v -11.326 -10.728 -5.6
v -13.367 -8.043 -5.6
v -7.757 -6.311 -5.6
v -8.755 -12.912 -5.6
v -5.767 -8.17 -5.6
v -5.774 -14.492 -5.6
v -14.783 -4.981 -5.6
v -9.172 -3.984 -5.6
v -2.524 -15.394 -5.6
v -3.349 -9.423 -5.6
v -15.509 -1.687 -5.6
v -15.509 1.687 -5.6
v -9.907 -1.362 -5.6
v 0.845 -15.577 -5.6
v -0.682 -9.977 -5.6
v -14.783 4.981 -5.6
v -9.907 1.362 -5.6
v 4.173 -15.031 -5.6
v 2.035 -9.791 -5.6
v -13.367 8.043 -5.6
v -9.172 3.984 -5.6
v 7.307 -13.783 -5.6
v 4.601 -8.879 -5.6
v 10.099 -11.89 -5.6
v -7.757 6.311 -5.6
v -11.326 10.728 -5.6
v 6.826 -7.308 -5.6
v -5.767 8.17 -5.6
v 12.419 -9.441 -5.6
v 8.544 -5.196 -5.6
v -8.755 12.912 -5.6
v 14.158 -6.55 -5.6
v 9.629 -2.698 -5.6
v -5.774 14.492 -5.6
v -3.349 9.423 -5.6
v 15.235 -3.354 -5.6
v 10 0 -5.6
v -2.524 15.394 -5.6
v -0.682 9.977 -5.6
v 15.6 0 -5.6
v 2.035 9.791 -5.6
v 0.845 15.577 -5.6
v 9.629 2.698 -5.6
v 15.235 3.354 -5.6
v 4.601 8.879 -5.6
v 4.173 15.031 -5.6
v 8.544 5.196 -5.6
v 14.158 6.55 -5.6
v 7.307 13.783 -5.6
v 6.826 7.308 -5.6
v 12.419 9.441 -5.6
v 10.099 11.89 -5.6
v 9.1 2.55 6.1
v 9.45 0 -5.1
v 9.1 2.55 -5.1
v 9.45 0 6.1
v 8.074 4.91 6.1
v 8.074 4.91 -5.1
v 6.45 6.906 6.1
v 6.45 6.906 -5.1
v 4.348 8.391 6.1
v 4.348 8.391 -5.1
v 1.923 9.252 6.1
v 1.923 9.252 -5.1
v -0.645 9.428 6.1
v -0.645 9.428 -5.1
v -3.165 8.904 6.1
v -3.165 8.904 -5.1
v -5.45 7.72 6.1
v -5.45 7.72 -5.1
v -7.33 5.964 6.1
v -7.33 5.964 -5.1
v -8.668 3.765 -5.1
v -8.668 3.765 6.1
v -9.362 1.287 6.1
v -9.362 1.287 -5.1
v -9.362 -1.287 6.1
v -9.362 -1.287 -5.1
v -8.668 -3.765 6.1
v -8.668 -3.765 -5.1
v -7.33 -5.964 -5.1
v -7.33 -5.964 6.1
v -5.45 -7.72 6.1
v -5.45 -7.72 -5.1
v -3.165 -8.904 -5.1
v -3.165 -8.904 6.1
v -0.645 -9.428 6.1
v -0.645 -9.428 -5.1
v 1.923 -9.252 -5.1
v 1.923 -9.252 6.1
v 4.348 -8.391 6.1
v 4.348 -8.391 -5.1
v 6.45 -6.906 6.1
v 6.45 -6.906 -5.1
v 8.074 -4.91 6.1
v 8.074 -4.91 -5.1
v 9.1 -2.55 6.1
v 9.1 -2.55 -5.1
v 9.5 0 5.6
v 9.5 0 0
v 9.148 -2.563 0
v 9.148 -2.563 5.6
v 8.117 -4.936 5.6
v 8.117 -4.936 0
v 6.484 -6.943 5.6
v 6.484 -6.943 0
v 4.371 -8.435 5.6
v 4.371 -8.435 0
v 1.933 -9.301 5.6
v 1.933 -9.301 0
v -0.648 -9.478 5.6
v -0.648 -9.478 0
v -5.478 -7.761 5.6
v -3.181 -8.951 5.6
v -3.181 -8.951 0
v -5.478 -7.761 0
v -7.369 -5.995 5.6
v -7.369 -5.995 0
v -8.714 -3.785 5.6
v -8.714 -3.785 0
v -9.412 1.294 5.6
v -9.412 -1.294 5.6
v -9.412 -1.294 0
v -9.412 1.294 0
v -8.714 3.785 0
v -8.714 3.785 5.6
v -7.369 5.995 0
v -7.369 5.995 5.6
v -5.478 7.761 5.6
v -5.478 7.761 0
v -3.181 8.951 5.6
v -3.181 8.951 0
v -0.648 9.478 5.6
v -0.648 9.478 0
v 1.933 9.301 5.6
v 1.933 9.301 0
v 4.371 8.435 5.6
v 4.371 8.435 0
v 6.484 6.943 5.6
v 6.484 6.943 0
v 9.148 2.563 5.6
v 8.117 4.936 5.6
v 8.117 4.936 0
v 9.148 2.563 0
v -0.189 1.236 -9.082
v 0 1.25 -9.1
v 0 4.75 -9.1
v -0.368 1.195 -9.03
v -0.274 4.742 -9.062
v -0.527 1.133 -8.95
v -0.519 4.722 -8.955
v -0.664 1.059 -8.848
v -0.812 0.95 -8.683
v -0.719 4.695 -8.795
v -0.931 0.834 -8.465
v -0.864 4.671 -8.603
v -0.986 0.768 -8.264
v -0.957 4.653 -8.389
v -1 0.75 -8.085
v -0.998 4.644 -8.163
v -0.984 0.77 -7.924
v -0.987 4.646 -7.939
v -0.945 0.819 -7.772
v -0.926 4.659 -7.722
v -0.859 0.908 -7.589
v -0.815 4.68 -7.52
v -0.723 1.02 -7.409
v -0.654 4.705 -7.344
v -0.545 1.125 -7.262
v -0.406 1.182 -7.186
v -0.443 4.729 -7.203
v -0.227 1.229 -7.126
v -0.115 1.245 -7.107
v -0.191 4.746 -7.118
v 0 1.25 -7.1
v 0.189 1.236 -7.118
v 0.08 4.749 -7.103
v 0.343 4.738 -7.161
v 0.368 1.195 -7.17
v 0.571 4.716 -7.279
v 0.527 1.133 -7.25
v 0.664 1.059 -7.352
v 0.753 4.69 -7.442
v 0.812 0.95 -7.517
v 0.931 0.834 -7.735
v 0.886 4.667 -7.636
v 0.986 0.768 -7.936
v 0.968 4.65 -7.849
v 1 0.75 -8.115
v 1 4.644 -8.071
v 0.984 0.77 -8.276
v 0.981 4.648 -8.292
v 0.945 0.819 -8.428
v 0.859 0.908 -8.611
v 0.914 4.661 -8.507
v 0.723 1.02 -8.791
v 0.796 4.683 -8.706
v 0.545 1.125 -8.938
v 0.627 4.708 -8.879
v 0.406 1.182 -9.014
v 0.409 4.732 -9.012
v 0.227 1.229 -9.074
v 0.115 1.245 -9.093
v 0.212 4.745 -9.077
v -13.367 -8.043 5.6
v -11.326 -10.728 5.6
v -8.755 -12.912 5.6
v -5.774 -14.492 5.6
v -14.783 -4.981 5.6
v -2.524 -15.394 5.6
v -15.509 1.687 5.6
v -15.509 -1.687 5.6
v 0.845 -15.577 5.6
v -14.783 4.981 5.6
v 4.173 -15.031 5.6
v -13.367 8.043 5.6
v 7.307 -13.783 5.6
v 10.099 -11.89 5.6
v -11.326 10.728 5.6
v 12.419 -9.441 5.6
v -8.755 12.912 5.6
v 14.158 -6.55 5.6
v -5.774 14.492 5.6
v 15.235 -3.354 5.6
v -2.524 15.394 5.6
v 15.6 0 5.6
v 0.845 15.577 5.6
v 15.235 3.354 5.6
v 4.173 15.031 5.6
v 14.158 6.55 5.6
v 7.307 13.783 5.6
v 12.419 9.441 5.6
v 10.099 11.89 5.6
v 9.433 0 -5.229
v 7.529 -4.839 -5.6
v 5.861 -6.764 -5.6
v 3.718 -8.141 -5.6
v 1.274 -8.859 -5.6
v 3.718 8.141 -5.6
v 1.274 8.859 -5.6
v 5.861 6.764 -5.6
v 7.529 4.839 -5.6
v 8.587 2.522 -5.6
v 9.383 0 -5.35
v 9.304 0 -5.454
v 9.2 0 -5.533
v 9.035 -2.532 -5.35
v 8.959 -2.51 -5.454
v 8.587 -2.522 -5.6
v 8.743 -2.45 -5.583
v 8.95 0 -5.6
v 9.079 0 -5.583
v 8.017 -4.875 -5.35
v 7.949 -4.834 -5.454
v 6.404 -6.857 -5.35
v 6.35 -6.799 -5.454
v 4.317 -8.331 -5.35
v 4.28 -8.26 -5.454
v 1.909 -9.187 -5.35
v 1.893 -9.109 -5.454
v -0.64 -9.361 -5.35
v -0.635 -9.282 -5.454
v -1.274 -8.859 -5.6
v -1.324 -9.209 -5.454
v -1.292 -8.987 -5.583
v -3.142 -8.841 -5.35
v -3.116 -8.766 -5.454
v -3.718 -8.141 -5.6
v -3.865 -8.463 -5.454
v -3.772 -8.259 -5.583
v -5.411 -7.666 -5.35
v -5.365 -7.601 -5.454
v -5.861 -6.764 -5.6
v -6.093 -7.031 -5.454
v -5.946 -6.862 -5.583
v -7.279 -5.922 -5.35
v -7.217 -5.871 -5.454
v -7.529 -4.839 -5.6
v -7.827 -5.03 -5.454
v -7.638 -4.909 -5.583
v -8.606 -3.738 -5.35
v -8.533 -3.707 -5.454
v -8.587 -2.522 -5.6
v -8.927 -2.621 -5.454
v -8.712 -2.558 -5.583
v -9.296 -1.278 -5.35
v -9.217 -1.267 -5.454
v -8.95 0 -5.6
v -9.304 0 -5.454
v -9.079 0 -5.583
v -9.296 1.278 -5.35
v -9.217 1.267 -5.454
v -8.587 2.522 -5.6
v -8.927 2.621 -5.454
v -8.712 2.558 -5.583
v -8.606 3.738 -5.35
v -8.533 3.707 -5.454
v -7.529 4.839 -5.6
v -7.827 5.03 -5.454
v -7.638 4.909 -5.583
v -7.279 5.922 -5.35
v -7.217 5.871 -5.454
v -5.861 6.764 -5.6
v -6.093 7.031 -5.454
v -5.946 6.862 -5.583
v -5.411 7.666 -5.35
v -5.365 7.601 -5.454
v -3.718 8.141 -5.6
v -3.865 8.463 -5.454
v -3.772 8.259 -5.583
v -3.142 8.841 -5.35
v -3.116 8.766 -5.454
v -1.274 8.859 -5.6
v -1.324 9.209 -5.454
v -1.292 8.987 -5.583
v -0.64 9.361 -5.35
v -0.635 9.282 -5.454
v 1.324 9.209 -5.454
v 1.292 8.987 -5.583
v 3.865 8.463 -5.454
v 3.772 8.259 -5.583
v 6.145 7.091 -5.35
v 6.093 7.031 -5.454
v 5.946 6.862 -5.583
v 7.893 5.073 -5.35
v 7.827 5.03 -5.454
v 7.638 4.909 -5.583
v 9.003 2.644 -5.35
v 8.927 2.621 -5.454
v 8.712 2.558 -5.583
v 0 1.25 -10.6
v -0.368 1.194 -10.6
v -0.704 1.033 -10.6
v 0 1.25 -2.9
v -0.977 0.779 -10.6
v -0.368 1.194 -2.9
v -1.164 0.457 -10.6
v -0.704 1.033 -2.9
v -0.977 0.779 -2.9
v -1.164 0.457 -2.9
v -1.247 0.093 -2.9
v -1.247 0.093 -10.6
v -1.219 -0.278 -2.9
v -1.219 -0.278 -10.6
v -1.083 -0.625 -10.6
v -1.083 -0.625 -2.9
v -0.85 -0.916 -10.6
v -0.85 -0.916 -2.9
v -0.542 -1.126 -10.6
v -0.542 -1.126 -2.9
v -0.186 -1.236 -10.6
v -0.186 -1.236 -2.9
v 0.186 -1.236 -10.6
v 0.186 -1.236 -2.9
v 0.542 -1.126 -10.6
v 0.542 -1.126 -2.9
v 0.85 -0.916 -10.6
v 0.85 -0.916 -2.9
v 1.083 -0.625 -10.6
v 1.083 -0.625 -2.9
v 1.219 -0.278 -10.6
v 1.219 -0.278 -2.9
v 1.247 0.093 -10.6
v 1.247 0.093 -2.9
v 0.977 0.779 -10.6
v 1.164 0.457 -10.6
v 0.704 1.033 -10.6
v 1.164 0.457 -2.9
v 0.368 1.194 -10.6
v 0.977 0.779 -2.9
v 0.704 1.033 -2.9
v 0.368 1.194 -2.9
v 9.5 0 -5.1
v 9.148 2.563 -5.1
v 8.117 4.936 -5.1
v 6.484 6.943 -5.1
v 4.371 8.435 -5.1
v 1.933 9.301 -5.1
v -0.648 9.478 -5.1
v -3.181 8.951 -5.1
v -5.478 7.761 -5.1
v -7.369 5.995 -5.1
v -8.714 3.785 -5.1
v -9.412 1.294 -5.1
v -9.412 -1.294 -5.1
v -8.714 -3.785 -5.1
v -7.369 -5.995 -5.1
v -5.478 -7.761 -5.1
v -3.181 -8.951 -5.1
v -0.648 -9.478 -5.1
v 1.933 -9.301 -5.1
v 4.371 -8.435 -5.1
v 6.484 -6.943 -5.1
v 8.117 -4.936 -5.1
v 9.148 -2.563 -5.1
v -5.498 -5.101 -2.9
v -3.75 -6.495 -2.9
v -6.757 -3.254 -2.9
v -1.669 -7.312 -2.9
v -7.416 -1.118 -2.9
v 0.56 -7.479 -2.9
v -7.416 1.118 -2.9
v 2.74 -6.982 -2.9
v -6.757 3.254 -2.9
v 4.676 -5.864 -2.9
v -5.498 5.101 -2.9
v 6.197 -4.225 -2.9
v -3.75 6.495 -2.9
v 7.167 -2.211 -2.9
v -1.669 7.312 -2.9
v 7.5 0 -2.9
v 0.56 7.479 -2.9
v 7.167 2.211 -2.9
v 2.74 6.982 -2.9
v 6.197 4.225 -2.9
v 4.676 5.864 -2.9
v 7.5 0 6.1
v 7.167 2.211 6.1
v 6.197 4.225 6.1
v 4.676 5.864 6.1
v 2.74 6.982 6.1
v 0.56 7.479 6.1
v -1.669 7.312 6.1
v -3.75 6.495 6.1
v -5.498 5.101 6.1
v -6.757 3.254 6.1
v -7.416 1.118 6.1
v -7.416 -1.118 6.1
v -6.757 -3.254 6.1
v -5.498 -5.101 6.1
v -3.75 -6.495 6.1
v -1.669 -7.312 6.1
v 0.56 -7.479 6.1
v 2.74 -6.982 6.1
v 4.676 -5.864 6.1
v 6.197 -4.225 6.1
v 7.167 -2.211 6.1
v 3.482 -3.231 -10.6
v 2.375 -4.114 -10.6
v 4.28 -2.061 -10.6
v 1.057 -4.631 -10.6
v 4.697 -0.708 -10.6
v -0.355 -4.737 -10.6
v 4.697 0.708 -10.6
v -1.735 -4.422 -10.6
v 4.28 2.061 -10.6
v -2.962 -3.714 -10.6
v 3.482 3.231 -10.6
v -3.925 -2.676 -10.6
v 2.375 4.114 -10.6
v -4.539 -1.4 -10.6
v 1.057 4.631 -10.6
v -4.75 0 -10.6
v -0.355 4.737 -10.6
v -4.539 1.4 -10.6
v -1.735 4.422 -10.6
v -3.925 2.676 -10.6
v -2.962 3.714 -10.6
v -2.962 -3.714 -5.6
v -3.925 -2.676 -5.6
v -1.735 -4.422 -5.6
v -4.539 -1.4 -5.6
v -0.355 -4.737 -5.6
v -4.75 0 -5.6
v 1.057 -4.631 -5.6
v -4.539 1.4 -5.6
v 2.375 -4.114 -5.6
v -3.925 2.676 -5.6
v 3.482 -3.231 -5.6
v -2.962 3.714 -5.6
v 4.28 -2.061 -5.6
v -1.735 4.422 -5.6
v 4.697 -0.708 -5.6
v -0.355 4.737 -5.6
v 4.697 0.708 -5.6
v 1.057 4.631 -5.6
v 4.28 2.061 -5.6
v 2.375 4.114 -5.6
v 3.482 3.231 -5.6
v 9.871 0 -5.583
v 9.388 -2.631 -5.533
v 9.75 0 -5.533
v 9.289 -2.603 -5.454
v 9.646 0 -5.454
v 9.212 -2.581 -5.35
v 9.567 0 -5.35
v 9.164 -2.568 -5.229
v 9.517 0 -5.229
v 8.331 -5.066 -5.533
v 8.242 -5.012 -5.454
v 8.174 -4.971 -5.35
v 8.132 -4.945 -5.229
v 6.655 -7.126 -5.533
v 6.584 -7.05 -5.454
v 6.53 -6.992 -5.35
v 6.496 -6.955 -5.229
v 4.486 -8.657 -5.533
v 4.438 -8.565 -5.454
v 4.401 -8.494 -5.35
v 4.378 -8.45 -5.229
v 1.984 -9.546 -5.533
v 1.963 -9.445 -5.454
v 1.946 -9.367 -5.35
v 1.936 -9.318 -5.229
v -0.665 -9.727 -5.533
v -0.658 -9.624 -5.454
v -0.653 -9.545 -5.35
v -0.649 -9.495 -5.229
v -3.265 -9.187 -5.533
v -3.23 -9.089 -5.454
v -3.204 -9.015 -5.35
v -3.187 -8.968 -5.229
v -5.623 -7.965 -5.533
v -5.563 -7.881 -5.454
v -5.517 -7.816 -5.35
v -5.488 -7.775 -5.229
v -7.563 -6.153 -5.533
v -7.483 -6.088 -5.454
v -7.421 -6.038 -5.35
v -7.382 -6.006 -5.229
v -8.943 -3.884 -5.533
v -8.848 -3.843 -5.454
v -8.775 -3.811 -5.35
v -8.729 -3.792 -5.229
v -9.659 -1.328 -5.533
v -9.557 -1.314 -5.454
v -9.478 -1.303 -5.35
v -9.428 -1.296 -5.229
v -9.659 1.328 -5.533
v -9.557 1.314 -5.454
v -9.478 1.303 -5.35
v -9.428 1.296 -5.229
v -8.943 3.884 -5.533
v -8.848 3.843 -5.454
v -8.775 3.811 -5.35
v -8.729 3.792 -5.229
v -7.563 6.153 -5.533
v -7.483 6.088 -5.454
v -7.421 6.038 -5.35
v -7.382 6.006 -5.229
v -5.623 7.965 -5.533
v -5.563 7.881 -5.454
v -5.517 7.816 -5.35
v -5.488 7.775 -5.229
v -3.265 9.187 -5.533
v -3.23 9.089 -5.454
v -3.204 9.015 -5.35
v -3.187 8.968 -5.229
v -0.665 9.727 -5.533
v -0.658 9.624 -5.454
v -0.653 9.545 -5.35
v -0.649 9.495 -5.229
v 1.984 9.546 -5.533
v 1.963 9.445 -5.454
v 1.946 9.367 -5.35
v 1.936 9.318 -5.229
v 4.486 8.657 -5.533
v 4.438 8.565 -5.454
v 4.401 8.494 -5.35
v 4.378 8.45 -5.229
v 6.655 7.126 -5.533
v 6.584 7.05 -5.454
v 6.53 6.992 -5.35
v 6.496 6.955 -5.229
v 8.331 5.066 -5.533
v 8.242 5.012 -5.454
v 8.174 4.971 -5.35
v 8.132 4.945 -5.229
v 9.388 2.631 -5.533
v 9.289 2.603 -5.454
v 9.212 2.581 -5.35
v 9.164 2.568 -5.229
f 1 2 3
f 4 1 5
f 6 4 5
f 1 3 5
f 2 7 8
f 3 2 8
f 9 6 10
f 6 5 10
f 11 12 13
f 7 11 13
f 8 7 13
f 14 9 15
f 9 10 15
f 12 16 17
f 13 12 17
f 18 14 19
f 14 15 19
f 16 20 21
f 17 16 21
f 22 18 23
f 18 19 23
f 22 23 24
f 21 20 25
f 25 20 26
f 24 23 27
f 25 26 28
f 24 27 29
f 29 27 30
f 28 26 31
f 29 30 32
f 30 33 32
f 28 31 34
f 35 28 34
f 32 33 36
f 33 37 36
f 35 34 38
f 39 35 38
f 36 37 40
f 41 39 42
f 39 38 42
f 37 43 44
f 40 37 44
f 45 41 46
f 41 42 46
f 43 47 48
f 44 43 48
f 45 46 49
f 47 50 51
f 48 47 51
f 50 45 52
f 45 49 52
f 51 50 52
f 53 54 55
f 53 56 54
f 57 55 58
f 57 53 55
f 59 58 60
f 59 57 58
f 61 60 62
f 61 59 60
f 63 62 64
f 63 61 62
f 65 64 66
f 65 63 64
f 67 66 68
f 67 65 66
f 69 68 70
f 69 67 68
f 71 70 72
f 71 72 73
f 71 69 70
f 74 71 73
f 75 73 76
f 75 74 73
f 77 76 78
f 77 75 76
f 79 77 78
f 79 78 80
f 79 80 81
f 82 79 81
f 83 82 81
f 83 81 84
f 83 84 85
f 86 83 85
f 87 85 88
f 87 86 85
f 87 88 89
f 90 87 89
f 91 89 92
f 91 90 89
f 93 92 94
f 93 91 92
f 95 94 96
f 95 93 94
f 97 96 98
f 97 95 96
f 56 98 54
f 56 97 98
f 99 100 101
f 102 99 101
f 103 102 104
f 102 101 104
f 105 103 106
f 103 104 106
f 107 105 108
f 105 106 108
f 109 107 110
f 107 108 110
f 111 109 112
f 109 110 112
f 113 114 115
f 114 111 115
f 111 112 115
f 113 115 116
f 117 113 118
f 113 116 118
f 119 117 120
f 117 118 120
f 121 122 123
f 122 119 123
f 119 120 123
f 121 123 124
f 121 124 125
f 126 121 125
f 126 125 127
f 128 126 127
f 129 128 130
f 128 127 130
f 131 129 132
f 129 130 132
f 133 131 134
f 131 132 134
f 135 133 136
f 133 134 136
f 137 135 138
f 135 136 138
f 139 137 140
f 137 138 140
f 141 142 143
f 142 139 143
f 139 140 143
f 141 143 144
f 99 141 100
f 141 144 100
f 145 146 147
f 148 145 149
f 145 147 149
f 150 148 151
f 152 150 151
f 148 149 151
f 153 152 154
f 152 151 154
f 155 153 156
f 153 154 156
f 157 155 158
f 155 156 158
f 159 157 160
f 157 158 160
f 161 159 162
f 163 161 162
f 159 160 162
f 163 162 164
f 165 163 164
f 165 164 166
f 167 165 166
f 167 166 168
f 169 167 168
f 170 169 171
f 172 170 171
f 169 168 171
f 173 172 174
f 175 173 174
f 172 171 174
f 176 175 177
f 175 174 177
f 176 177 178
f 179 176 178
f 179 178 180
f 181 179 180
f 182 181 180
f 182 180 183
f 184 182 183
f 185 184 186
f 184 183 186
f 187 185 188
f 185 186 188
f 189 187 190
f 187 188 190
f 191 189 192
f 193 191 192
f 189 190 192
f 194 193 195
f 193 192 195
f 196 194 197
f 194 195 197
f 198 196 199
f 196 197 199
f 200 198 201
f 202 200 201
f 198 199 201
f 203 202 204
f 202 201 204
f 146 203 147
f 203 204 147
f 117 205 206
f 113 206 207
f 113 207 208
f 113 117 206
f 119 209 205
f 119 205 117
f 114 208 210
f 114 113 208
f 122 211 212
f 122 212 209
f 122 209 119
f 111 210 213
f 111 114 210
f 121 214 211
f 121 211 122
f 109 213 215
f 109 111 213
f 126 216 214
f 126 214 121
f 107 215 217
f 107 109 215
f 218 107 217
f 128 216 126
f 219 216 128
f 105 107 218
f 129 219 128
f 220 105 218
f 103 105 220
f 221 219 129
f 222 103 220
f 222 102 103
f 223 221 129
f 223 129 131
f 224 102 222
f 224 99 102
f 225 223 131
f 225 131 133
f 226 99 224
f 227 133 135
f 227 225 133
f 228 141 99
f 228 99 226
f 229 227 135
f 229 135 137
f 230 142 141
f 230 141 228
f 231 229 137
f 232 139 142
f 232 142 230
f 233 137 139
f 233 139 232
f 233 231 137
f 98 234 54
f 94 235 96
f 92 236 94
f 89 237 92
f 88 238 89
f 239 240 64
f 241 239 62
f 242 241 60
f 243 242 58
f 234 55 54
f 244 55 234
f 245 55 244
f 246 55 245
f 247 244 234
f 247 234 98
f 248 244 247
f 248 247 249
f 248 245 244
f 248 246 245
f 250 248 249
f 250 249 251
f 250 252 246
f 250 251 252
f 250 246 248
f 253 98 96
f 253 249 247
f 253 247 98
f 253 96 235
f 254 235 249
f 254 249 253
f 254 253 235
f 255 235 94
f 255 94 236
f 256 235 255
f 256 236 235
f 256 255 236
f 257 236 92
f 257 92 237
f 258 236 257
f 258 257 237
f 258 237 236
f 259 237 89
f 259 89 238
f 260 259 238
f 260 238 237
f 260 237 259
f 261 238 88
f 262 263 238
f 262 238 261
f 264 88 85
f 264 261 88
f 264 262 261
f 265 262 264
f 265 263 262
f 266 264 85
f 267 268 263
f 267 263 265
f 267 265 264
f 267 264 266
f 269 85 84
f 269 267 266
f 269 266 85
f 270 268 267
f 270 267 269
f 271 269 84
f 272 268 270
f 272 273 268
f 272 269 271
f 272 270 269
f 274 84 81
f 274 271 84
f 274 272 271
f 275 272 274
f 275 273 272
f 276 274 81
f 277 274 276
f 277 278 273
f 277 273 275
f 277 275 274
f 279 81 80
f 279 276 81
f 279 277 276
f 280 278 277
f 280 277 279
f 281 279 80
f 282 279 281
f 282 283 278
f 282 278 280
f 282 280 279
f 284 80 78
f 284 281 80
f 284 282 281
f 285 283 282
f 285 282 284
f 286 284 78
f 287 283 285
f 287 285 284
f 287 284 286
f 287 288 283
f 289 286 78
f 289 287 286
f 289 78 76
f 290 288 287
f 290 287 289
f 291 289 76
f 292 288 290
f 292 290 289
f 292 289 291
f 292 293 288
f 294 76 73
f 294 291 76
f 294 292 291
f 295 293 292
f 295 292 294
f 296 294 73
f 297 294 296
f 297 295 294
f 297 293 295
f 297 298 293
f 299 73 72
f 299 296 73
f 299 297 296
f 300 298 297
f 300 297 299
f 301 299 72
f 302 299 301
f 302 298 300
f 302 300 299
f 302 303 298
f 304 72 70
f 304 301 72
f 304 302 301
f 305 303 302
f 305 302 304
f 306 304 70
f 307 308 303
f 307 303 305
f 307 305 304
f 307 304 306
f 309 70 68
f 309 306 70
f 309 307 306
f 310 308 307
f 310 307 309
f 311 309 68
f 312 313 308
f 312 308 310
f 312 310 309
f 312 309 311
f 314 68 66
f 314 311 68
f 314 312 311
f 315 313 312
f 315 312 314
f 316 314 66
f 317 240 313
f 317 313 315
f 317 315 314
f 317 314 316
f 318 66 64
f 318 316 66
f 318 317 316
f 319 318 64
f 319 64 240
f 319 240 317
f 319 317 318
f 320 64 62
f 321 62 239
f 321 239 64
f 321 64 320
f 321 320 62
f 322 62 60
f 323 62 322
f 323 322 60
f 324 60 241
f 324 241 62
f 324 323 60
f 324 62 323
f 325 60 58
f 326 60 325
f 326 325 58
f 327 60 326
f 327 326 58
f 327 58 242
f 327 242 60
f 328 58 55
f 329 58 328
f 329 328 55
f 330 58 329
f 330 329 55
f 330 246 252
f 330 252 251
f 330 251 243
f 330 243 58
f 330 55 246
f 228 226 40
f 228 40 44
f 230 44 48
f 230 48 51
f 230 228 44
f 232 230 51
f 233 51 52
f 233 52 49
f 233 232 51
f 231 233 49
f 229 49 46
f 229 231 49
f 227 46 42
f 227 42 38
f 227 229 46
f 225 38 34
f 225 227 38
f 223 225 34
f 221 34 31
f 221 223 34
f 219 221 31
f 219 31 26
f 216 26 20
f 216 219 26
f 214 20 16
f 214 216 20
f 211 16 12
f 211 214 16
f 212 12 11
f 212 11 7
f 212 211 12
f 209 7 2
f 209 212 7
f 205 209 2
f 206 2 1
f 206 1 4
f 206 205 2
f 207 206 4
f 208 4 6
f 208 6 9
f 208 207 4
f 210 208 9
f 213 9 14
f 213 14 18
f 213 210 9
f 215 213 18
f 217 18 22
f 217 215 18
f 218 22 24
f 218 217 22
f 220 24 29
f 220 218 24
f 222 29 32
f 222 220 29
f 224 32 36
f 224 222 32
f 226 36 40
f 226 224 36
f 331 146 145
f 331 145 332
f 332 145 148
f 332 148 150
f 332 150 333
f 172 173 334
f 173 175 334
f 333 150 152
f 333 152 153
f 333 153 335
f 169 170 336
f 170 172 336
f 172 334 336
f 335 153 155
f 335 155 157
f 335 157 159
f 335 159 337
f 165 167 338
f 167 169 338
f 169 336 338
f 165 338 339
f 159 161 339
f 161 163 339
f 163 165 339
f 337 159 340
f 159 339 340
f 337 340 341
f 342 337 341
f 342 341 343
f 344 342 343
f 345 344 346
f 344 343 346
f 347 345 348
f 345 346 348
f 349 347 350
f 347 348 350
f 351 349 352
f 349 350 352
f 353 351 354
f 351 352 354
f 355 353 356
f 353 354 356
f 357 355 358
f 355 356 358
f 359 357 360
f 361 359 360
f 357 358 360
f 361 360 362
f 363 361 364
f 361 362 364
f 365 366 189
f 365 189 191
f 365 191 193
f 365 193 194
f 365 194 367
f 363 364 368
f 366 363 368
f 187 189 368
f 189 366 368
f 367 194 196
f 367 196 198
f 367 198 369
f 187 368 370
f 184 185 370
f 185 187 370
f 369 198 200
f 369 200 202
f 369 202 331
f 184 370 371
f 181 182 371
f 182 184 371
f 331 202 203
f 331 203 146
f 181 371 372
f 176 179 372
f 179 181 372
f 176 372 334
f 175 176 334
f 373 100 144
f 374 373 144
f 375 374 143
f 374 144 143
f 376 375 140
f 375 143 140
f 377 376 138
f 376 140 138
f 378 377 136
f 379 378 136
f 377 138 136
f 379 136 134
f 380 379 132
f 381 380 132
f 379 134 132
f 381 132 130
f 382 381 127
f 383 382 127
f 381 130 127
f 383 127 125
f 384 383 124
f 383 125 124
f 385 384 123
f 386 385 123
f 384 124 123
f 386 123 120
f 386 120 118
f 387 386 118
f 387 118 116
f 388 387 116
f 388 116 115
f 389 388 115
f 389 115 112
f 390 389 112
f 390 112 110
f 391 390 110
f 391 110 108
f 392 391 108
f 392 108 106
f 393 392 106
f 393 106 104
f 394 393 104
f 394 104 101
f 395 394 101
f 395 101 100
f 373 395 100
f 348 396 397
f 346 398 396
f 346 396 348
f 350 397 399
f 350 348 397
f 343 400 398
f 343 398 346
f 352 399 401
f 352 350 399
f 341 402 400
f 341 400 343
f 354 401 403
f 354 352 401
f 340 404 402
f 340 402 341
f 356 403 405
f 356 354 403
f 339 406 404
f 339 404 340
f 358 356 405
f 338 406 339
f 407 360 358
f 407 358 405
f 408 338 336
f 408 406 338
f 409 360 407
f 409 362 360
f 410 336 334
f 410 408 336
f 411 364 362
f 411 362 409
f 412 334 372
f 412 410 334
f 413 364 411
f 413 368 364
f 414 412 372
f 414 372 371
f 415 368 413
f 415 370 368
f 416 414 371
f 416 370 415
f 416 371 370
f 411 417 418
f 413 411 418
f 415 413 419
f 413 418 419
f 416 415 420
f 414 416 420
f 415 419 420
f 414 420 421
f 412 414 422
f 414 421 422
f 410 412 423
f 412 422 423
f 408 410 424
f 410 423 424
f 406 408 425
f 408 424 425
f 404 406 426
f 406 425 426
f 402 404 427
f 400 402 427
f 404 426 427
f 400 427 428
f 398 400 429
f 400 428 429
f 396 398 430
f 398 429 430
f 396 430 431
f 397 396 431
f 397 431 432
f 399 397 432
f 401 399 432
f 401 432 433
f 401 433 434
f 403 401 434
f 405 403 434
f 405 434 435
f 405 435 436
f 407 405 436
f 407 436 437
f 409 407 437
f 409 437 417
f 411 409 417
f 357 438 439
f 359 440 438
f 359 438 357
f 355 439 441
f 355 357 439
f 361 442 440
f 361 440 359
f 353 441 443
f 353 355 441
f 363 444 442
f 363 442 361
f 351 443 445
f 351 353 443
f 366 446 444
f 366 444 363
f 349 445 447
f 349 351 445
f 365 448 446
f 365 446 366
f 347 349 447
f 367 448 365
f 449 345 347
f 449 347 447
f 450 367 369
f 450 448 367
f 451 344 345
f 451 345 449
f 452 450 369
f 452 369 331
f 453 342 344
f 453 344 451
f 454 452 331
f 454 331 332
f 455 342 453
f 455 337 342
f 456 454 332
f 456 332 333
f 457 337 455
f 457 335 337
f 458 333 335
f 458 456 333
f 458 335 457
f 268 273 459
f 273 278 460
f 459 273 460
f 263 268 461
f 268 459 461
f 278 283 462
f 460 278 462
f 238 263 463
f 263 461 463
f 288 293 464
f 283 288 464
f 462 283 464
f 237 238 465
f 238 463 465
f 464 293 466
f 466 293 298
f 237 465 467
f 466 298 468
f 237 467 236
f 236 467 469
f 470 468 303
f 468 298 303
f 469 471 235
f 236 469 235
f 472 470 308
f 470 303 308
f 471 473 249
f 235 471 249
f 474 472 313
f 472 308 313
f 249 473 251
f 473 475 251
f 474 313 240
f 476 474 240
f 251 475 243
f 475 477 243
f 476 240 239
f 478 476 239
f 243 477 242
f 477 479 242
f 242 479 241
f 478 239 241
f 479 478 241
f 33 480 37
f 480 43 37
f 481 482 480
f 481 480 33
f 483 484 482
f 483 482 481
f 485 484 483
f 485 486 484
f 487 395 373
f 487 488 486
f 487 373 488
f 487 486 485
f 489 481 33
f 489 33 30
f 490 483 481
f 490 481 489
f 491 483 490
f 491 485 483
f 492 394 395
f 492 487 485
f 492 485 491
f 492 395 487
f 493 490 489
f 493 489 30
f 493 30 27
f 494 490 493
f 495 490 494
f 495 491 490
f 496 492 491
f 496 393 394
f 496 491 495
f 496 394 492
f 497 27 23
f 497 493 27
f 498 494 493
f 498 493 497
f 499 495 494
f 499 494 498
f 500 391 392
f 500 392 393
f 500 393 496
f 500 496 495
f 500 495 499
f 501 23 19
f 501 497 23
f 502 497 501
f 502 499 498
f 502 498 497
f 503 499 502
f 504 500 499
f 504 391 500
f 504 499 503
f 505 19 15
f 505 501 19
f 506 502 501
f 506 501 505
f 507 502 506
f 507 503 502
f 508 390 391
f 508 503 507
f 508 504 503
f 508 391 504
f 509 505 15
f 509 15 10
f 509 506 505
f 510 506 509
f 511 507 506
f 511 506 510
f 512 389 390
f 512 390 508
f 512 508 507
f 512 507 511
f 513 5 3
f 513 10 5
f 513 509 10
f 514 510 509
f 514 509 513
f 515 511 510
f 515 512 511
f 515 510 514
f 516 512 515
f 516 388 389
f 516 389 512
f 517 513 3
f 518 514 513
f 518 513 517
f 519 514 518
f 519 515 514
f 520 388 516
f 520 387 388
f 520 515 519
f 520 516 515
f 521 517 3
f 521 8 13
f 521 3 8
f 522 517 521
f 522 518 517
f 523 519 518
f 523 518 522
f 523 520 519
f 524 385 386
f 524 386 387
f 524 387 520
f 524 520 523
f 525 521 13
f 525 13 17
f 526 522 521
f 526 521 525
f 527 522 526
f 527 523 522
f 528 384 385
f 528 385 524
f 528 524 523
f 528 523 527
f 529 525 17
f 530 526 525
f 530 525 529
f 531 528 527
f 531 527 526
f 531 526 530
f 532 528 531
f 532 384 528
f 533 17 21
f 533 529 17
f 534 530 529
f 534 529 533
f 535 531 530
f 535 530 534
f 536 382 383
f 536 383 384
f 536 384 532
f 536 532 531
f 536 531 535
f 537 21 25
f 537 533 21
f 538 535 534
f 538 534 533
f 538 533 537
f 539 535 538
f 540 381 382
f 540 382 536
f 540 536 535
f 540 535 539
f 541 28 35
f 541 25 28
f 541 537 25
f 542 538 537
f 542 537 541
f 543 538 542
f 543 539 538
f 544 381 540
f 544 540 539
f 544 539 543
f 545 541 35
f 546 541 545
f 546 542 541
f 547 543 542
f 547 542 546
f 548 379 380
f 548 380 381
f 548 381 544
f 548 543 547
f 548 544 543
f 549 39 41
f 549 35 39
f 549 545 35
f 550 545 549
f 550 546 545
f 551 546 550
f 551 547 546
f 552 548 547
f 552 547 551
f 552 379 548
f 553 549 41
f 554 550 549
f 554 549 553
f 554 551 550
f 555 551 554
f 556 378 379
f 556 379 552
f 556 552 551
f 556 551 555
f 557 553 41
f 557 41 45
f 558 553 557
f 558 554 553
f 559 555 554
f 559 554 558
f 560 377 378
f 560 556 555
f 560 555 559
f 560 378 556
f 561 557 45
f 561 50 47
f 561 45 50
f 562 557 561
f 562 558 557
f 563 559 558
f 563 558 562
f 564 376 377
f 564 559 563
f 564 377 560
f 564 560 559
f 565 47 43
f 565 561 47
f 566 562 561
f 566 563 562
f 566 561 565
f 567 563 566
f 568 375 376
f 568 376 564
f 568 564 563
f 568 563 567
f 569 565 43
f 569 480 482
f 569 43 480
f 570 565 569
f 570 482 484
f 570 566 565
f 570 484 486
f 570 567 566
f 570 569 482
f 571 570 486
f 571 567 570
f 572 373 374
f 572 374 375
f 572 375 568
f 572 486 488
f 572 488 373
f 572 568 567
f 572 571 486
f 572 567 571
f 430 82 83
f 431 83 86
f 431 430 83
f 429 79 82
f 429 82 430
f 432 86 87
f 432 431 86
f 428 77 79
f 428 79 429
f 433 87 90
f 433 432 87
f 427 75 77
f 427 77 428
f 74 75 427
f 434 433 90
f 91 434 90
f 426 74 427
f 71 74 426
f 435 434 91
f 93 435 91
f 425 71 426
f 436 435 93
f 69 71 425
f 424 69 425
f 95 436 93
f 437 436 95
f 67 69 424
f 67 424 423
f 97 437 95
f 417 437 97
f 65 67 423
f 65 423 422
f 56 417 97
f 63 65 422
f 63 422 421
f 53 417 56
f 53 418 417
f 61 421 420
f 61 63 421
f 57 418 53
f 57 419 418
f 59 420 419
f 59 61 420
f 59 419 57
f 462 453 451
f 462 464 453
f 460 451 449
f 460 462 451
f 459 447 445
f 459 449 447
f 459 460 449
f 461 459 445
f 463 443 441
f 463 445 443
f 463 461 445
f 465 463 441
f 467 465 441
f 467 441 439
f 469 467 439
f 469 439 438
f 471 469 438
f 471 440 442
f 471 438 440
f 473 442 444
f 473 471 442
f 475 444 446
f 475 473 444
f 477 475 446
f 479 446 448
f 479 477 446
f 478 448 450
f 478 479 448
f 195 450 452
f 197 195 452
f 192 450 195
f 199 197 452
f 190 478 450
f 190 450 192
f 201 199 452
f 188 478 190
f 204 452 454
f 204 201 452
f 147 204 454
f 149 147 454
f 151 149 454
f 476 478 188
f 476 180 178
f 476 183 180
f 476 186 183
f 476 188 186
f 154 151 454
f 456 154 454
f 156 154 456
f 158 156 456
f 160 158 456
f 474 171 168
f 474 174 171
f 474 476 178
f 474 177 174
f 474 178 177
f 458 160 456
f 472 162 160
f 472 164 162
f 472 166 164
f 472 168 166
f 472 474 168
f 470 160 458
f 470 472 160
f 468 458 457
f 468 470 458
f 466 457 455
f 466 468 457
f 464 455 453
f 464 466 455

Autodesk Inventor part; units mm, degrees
ref_plane "YZ Plane" through (0, 0, 0) normal (1, 0, 0) x (0, 1, 0)
ref_plane "XZ Plane" through (0, 0, 0) normal (0, 1, 0) x (-1, 0, 0)
ref_plane "XY Plane" through (0, 0, 0) normal (0, 0, 1) x (1, 0, 0)
sketch "Skizze2" plane through (0, 0, 0) normal (0, 0, 1) x (1, 0, 0)
  circle A0 centre (0, 0) radius 9.5
  circle A1 centre (0, 0) radius 15.6
  dimension "d2" = 19
  dimension "d3" = 31.2
extrude "Extrusion1" add sketch "Skizze2" along normal mid plane 11.2
sketch "Skizze3" plane through (0, 0, 5.6) normal (0, 0, 1) x (1, 0, 0)
  circle A0 centre (0, 0) radius 9.45
  dimension "d6" = 18.9
extrude "Extrusion2" add sketch "Skizze3" along normal blind 0.5 and the other way blind 11.2
fillet "Rundung1" radius 0.5 1 edges at (-9.45, 0, -5.6)
fillet "Rundung2" radius 0.5 1 edges at (-9.5, 0, -5.6)
sketch "Skizze4" plane through (0, 0, 6.1) normal (0, 0, 1) x (1, 0, 0)
  circle A0 centre (0, 0) radius 7.5
  dimension "d13" = 15
extrude "Extrusion3" cut sketch "Skizze4" against normal blind 9
sketch "Skizze6" plane through (0, 0, -5.6) normal (0, 0, -1) x (-1, 0, 0)
  circle A0 centre (0, 0) radius 4.75
  dimension "d23" = 9.5
extrude "Extrusion4" add sketch "Skizze6" along normal blind 5
sketch "Skizze7" plane through (0, 0, -10.6) normal (0, 0, -1) x (-1, 0, 0)
  point P0 (0, 0)
  point P1 (0, 0)
  point P2 (0, 0)
hole "Bohrung2" at (0, 0, -10.6) direction (0, 0, 1) diameter 2.5 end through all
sketch "Skizze8" plane through (0, 0, 0) normal (0, 1, 0) x (-1, 0, 0)
  line L0 (0, 0) -> (0, -22.2603) construction
  line L1 (-4.75, -5.6) -> (-4.75, -10.6) projected
  line L2 (-4.75, -8.1) -> (11.4066, -8.1) construction
  point P0 (0, -8.1)
hole "Bohrung3" at (0, 0, -8.1) direction (0, 1, 0) diameter 2 depth 6.75 tip angle 118
thread "Gewinde1" size "M2x0.4" class "6H" standard "ANSI Metric M Profile" full length
properties part number "Antriebsrad_V1"
